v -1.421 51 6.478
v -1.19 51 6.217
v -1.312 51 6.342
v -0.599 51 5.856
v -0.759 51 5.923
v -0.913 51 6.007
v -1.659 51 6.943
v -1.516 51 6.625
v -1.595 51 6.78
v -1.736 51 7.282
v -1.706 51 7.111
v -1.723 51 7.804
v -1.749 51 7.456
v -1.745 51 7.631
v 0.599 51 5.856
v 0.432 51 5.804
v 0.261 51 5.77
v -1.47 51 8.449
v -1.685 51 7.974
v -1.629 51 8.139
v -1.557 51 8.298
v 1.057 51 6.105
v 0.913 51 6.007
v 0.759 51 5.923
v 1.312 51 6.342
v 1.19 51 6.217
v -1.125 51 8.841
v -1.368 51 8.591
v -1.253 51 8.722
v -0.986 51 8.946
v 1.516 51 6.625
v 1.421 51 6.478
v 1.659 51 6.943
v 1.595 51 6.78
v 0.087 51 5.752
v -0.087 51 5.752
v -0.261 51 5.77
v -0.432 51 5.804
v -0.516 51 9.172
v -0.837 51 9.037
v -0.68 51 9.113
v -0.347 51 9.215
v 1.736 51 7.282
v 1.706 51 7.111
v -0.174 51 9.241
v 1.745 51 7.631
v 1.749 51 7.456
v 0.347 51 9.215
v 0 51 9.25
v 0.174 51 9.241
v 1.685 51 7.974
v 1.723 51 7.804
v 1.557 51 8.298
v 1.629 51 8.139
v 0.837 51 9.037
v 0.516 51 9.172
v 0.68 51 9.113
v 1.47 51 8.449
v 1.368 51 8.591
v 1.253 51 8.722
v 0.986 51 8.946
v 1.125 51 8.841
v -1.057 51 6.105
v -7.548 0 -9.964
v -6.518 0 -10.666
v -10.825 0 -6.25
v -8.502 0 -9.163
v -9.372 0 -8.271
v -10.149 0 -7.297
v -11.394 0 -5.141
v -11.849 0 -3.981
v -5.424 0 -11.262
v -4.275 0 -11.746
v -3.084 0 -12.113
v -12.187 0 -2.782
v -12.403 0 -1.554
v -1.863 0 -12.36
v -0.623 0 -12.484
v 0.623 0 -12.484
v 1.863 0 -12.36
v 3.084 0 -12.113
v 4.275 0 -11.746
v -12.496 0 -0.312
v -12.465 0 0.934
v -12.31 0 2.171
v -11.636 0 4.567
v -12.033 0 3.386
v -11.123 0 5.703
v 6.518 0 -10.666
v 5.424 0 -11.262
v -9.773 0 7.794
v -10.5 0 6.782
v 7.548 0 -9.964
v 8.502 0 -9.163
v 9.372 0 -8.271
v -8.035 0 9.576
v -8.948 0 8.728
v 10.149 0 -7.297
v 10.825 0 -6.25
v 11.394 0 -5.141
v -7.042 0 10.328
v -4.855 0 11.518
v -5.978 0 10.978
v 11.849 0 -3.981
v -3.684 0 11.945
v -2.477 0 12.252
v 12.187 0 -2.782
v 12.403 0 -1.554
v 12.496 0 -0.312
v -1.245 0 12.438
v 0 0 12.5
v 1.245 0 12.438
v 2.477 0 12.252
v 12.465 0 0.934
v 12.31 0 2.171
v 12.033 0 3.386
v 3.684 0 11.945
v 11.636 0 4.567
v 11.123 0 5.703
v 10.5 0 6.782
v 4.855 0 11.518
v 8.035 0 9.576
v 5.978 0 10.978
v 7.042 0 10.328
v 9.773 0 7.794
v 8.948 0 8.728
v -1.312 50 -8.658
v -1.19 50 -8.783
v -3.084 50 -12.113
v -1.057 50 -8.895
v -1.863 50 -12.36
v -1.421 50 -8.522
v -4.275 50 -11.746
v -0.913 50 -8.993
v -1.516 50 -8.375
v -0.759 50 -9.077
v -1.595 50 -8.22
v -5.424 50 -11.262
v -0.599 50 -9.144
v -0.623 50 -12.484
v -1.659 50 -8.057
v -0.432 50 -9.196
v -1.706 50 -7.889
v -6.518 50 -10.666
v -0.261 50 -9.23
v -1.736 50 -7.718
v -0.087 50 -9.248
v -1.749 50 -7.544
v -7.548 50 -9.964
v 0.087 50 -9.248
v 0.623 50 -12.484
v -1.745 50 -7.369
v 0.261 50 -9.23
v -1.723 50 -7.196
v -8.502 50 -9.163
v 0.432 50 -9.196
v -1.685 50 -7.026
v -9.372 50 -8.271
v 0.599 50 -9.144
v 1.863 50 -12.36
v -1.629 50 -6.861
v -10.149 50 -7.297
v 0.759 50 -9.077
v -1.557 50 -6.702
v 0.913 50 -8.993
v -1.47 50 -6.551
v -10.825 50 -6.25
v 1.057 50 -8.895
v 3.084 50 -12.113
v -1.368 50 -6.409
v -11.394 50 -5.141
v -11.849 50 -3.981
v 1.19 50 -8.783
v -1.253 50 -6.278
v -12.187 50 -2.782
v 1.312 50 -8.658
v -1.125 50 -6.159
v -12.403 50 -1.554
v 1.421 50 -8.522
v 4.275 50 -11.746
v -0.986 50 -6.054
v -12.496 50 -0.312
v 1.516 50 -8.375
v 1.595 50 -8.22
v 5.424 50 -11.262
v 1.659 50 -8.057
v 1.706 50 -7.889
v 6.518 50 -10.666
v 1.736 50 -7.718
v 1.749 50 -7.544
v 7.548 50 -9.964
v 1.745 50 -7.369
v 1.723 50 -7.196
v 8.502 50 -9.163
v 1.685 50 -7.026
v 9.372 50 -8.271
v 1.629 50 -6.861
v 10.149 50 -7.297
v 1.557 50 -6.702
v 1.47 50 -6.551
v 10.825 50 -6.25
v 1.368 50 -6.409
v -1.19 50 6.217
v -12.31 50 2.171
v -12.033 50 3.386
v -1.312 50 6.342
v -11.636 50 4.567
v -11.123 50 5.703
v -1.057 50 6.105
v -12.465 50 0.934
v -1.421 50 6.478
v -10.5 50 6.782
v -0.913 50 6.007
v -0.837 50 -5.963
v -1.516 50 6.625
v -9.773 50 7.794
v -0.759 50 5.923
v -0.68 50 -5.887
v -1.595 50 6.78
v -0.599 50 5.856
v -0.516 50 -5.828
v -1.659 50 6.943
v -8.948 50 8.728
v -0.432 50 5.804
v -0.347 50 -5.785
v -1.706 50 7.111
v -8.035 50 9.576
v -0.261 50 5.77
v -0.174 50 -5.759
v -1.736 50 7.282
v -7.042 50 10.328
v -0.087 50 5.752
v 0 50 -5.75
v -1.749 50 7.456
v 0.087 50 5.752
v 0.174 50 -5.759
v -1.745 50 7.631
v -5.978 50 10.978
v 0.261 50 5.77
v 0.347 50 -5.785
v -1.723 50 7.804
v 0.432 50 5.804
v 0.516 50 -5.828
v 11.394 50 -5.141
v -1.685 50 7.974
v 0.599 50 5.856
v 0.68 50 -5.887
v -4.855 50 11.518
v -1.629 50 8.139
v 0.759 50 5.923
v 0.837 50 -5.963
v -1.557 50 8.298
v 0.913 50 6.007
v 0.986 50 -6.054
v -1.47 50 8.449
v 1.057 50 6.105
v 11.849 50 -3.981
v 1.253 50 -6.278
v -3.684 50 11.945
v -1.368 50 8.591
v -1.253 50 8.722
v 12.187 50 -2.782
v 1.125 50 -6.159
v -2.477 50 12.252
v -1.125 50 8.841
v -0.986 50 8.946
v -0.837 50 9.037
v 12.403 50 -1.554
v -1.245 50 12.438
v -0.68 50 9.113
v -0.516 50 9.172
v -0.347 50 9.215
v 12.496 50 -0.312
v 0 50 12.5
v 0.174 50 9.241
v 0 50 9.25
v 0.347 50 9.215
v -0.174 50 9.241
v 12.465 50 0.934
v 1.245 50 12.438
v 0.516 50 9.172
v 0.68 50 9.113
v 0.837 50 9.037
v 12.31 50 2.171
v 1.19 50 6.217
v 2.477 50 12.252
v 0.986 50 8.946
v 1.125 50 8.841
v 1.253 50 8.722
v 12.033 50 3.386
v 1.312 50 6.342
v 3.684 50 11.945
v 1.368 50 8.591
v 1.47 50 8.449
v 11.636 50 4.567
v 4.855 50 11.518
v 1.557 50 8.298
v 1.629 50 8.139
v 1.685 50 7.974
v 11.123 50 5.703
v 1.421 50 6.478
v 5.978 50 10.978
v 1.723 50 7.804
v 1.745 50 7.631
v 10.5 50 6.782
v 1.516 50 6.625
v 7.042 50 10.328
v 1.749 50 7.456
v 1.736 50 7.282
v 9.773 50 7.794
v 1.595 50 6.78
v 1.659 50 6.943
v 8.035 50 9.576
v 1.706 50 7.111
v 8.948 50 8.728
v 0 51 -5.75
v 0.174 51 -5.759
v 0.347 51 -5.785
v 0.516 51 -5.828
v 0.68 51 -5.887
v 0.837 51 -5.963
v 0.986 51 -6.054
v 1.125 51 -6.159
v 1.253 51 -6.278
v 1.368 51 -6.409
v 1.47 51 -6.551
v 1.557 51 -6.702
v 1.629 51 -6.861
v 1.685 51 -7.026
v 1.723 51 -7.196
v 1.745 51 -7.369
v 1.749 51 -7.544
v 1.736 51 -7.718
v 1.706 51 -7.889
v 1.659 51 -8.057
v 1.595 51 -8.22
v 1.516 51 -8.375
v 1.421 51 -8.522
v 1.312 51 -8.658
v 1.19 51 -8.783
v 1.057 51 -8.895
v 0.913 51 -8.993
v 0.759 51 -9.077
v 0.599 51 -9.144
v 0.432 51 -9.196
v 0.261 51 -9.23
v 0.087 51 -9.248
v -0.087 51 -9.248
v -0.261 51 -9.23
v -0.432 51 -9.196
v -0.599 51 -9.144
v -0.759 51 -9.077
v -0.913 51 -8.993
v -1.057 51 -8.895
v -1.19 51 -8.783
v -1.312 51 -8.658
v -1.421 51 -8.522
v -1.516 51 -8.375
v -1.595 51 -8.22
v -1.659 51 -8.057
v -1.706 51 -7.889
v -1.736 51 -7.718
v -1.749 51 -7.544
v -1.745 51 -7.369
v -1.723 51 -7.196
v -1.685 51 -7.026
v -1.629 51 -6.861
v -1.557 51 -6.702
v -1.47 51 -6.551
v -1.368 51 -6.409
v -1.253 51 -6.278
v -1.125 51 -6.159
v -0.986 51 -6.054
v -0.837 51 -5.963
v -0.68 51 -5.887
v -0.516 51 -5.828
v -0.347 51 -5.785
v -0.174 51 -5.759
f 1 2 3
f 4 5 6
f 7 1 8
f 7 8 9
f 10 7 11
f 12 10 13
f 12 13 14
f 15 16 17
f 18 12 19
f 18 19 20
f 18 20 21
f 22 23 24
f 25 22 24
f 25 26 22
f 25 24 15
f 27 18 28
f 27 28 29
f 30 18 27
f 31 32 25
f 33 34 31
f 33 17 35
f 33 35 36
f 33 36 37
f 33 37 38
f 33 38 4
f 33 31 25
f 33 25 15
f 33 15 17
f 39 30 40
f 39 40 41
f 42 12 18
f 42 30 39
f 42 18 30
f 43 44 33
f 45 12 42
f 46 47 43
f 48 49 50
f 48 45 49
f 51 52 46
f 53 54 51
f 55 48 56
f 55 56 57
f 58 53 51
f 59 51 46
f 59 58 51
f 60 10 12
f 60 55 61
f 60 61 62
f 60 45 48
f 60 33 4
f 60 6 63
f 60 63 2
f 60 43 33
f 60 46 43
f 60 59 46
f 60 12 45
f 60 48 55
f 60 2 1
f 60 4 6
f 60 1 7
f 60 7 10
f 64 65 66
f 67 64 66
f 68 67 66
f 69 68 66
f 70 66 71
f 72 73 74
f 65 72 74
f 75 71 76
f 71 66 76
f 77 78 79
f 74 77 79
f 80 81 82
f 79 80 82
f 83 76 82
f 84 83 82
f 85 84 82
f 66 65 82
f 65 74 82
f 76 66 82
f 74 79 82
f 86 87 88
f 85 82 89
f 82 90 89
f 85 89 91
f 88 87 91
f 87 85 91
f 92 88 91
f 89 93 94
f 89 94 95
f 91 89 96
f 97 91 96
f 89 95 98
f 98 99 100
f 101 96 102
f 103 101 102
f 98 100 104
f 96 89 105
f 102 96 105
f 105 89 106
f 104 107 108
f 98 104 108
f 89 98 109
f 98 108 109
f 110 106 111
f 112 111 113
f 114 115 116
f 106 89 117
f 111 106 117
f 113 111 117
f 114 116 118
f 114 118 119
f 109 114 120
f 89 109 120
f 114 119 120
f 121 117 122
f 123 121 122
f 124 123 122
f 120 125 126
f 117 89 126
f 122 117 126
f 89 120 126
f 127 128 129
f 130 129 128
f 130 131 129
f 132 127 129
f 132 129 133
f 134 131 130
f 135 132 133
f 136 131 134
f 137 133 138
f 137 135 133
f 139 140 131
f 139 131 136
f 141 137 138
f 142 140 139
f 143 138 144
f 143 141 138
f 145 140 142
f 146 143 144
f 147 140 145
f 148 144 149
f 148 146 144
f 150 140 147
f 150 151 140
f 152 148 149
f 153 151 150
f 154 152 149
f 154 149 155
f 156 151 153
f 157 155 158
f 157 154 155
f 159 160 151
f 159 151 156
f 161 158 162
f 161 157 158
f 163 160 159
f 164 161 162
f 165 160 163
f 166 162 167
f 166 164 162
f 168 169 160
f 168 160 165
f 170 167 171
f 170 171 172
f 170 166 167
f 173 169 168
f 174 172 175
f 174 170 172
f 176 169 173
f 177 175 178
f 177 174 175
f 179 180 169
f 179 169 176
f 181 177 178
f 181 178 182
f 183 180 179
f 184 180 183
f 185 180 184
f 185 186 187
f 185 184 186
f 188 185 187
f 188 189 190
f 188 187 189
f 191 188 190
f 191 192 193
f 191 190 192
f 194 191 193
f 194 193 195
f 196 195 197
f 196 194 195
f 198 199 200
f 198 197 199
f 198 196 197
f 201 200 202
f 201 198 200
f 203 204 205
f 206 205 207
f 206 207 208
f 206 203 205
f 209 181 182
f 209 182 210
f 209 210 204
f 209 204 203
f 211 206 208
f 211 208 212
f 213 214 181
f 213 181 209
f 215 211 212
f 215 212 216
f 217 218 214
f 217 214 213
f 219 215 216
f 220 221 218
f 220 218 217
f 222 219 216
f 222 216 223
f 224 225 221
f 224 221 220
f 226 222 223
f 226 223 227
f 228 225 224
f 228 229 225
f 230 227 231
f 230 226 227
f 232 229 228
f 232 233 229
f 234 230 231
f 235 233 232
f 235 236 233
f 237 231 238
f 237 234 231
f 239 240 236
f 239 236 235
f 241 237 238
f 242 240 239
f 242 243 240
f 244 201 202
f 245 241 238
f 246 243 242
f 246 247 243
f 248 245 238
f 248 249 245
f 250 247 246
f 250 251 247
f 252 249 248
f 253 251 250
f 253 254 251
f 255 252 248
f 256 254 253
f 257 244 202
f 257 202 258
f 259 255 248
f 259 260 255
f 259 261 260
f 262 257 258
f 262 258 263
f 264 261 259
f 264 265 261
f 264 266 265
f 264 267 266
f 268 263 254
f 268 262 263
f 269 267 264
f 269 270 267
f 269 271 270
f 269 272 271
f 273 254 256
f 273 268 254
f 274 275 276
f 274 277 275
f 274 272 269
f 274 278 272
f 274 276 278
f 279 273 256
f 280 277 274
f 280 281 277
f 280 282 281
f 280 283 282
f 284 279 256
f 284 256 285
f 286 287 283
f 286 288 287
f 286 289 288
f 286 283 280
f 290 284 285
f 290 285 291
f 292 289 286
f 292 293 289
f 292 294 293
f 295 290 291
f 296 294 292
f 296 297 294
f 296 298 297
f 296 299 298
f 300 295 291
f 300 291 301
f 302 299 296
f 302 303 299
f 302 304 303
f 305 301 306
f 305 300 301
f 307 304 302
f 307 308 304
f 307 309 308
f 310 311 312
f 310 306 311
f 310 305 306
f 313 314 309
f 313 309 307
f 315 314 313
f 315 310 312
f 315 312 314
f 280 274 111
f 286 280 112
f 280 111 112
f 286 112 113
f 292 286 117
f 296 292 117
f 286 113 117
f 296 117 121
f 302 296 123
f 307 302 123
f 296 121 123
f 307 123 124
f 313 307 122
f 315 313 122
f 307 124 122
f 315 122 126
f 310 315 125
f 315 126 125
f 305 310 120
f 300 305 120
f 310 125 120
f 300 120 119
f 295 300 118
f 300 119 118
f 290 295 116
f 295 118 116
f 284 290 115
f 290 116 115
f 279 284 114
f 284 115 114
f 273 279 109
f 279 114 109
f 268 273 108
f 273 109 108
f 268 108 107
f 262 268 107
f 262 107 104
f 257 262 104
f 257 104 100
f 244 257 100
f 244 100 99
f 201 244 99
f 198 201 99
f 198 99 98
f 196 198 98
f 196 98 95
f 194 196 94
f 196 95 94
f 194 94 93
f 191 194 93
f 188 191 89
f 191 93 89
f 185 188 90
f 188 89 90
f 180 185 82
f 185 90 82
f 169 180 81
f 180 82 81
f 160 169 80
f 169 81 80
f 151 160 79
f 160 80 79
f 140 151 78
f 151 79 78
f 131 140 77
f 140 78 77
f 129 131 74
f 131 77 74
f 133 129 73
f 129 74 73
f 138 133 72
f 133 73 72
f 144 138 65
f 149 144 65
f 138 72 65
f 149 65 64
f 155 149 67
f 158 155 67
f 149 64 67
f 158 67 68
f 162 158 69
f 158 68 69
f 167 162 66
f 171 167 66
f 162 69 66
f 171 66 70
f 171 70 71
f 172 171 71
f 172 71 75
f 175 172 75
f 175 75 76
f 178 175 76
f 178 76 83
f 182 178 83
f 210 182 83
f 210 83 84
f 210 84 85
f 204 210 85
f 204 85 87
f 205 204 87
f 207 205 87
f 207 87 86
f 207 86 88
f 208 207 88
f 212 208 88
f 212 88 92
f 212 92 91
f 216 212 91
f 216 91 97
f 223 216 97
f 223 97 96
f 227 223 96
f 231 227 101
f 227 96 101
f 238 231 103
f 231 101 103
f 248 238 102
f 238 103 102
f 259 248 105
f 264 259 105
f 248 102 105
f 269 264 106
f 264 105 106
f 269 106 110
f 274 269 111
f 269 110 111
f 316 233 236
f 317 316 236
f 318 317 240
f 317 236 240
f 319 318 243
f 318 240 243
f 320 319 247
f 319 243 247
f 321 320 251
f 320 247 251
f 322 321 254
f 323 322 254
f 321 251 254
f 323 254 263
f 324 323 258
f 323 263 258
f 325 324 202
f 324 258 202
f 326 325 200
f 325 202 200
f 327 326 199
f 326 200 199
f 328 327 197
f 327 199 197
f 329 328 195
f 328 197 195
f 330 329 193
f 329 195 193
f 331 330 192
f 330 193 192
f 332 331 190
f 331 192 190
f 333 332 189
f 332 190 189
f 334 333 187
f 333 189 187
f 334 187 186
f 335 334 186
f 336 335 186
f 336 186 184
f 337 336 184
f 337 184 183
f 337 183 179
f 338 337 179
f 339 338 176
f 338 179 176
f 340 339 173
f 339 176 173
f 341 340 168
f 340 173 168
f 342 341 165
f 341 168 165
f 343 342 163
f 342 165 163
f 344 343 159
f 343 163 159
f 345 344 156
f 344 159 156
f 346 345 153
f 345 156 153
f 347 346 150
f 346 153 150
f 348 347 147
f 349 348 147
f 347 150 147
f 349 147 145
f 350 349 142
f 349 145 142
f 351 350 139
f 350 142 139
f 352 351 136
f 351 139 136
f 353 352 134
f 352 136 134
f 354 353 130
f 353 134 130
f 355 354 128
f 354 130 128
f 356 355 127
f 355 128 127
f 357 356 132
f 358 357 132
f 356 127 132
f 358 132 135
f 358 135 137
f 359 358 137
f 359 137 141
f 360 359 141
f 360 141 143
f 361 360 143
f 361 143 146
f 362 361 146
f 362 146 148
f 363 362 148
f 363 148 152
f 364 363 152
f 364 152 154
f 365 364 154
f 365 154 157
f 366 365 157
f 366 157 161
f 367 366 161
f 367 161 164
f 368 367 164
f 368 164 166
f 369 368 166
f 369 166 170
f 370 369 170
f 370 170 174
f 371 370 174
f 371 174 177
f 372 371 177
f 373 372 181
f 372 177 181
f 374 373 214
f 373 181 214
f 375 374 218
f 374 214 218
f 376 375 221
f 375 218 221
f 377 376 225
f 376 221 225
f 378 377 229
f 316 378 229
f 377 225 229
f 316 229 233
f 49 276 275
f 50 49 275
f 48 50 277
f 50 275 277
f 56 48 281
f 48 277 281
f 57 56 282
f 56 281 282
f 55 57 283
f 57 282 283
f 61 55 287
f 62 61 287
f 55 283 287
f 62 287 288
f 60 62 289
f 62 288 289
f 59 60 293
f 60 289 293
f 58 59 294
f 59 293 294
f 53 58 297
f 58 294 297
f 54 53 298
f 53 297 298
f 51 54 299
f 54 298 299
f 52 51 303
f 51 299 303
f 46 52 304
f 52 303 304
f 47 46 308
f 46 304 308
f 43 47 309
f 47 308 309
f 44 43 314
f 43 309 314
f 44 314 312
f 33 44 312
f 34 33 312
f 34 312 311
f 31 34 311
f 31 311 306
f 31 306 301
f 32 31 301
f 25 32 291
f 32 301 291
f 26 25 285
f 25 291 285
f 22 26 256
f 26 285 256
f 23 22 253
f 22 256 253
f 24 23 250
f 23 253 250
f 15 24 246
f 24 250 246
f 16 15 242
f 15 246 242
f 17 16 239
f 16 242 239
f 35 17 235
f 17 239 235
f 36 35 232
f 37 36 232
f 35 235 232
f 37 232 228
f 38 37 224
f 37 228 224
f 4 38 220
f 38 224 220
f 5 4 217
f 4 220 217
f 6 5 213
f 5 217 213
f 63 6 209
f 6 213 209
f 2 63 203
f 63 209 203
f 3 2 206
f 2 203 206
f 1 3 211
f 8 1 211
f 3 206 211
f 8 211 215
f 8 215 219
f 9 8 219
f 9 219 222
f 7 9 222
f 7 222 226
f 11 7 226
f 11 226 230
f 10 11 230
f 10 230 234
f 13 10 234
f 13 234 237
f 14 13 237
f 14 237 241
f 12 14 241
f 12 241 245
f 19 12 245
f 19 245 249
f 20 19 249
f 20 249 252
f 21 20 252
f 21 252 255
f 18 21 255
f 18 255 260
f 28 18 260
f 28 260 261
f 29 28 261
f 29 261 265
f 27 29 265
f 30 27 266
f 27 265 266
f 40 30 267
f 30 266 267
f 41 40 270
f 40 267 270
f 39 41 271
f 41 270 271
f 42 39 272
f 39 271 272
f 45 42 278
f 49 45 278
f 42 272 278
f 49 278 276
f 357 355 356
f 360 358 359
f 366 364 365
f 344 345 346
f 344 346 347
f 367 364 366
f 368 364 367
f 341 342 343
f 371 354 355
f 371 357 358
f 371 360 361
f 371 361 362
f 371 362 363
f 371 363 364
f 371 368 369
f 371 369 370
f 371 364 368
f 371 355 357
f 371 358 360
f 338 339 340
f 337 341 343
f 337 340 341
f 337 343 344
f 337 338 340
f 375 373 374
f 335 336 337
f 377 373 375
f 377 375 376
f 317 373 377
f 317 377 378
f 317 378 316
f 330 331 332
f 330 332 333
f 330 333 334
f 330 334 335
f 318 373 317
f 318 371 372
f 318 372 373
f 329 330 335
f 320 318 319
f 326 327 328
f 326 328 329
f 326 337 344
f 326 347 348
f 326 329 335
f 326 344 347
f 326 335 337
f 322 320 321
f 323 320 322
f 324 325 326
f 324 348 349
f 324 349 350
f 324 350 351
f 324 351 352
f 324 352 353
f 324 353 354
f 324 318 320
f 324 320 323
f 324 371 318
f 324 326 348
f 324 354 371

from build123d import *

# Parameters (mm, degrees)
SKETCH1_R           = 12.5
BOSS_EXTRUDE1_DEPTH = 50
SKETCH2_R           = 1.75
BOSS_EXTRUDE2_DEPTH = 1


with BuildPart() as part:
    # Sketch1 → Boss-Extrude1 (new body)
    with BuildSketch(Plane(origin=(0, 0, 0), x_dir=(1, 0, 0), z_dir=(0, 1, 0))):
        with Locations(Location((0, 0, 0), (0, 0, 270))):
            Circle(SKETCH1_R)
    extrude(amount=BOSS_EXTRUDE1_DEPTH)

    # Sketch2 → Boss-Extrude2 (add)
    with BuildSketch(Plane(origin=(0, 50, 0), x_dir=(1, 0, 0), z_dir=(0, 1, 0))):
        with Locations(Location((0, 7.5, 0), (0, 0, 270))):
            Circle(SKETCH2_R)
        with Locations(Location((0, -7.5, 0), (0, 0, 270))):
            Circle(SKETCH2_R)
    extrude(amount=BOSS_EXTRUDE2_DEPTH)


solid = part.part
